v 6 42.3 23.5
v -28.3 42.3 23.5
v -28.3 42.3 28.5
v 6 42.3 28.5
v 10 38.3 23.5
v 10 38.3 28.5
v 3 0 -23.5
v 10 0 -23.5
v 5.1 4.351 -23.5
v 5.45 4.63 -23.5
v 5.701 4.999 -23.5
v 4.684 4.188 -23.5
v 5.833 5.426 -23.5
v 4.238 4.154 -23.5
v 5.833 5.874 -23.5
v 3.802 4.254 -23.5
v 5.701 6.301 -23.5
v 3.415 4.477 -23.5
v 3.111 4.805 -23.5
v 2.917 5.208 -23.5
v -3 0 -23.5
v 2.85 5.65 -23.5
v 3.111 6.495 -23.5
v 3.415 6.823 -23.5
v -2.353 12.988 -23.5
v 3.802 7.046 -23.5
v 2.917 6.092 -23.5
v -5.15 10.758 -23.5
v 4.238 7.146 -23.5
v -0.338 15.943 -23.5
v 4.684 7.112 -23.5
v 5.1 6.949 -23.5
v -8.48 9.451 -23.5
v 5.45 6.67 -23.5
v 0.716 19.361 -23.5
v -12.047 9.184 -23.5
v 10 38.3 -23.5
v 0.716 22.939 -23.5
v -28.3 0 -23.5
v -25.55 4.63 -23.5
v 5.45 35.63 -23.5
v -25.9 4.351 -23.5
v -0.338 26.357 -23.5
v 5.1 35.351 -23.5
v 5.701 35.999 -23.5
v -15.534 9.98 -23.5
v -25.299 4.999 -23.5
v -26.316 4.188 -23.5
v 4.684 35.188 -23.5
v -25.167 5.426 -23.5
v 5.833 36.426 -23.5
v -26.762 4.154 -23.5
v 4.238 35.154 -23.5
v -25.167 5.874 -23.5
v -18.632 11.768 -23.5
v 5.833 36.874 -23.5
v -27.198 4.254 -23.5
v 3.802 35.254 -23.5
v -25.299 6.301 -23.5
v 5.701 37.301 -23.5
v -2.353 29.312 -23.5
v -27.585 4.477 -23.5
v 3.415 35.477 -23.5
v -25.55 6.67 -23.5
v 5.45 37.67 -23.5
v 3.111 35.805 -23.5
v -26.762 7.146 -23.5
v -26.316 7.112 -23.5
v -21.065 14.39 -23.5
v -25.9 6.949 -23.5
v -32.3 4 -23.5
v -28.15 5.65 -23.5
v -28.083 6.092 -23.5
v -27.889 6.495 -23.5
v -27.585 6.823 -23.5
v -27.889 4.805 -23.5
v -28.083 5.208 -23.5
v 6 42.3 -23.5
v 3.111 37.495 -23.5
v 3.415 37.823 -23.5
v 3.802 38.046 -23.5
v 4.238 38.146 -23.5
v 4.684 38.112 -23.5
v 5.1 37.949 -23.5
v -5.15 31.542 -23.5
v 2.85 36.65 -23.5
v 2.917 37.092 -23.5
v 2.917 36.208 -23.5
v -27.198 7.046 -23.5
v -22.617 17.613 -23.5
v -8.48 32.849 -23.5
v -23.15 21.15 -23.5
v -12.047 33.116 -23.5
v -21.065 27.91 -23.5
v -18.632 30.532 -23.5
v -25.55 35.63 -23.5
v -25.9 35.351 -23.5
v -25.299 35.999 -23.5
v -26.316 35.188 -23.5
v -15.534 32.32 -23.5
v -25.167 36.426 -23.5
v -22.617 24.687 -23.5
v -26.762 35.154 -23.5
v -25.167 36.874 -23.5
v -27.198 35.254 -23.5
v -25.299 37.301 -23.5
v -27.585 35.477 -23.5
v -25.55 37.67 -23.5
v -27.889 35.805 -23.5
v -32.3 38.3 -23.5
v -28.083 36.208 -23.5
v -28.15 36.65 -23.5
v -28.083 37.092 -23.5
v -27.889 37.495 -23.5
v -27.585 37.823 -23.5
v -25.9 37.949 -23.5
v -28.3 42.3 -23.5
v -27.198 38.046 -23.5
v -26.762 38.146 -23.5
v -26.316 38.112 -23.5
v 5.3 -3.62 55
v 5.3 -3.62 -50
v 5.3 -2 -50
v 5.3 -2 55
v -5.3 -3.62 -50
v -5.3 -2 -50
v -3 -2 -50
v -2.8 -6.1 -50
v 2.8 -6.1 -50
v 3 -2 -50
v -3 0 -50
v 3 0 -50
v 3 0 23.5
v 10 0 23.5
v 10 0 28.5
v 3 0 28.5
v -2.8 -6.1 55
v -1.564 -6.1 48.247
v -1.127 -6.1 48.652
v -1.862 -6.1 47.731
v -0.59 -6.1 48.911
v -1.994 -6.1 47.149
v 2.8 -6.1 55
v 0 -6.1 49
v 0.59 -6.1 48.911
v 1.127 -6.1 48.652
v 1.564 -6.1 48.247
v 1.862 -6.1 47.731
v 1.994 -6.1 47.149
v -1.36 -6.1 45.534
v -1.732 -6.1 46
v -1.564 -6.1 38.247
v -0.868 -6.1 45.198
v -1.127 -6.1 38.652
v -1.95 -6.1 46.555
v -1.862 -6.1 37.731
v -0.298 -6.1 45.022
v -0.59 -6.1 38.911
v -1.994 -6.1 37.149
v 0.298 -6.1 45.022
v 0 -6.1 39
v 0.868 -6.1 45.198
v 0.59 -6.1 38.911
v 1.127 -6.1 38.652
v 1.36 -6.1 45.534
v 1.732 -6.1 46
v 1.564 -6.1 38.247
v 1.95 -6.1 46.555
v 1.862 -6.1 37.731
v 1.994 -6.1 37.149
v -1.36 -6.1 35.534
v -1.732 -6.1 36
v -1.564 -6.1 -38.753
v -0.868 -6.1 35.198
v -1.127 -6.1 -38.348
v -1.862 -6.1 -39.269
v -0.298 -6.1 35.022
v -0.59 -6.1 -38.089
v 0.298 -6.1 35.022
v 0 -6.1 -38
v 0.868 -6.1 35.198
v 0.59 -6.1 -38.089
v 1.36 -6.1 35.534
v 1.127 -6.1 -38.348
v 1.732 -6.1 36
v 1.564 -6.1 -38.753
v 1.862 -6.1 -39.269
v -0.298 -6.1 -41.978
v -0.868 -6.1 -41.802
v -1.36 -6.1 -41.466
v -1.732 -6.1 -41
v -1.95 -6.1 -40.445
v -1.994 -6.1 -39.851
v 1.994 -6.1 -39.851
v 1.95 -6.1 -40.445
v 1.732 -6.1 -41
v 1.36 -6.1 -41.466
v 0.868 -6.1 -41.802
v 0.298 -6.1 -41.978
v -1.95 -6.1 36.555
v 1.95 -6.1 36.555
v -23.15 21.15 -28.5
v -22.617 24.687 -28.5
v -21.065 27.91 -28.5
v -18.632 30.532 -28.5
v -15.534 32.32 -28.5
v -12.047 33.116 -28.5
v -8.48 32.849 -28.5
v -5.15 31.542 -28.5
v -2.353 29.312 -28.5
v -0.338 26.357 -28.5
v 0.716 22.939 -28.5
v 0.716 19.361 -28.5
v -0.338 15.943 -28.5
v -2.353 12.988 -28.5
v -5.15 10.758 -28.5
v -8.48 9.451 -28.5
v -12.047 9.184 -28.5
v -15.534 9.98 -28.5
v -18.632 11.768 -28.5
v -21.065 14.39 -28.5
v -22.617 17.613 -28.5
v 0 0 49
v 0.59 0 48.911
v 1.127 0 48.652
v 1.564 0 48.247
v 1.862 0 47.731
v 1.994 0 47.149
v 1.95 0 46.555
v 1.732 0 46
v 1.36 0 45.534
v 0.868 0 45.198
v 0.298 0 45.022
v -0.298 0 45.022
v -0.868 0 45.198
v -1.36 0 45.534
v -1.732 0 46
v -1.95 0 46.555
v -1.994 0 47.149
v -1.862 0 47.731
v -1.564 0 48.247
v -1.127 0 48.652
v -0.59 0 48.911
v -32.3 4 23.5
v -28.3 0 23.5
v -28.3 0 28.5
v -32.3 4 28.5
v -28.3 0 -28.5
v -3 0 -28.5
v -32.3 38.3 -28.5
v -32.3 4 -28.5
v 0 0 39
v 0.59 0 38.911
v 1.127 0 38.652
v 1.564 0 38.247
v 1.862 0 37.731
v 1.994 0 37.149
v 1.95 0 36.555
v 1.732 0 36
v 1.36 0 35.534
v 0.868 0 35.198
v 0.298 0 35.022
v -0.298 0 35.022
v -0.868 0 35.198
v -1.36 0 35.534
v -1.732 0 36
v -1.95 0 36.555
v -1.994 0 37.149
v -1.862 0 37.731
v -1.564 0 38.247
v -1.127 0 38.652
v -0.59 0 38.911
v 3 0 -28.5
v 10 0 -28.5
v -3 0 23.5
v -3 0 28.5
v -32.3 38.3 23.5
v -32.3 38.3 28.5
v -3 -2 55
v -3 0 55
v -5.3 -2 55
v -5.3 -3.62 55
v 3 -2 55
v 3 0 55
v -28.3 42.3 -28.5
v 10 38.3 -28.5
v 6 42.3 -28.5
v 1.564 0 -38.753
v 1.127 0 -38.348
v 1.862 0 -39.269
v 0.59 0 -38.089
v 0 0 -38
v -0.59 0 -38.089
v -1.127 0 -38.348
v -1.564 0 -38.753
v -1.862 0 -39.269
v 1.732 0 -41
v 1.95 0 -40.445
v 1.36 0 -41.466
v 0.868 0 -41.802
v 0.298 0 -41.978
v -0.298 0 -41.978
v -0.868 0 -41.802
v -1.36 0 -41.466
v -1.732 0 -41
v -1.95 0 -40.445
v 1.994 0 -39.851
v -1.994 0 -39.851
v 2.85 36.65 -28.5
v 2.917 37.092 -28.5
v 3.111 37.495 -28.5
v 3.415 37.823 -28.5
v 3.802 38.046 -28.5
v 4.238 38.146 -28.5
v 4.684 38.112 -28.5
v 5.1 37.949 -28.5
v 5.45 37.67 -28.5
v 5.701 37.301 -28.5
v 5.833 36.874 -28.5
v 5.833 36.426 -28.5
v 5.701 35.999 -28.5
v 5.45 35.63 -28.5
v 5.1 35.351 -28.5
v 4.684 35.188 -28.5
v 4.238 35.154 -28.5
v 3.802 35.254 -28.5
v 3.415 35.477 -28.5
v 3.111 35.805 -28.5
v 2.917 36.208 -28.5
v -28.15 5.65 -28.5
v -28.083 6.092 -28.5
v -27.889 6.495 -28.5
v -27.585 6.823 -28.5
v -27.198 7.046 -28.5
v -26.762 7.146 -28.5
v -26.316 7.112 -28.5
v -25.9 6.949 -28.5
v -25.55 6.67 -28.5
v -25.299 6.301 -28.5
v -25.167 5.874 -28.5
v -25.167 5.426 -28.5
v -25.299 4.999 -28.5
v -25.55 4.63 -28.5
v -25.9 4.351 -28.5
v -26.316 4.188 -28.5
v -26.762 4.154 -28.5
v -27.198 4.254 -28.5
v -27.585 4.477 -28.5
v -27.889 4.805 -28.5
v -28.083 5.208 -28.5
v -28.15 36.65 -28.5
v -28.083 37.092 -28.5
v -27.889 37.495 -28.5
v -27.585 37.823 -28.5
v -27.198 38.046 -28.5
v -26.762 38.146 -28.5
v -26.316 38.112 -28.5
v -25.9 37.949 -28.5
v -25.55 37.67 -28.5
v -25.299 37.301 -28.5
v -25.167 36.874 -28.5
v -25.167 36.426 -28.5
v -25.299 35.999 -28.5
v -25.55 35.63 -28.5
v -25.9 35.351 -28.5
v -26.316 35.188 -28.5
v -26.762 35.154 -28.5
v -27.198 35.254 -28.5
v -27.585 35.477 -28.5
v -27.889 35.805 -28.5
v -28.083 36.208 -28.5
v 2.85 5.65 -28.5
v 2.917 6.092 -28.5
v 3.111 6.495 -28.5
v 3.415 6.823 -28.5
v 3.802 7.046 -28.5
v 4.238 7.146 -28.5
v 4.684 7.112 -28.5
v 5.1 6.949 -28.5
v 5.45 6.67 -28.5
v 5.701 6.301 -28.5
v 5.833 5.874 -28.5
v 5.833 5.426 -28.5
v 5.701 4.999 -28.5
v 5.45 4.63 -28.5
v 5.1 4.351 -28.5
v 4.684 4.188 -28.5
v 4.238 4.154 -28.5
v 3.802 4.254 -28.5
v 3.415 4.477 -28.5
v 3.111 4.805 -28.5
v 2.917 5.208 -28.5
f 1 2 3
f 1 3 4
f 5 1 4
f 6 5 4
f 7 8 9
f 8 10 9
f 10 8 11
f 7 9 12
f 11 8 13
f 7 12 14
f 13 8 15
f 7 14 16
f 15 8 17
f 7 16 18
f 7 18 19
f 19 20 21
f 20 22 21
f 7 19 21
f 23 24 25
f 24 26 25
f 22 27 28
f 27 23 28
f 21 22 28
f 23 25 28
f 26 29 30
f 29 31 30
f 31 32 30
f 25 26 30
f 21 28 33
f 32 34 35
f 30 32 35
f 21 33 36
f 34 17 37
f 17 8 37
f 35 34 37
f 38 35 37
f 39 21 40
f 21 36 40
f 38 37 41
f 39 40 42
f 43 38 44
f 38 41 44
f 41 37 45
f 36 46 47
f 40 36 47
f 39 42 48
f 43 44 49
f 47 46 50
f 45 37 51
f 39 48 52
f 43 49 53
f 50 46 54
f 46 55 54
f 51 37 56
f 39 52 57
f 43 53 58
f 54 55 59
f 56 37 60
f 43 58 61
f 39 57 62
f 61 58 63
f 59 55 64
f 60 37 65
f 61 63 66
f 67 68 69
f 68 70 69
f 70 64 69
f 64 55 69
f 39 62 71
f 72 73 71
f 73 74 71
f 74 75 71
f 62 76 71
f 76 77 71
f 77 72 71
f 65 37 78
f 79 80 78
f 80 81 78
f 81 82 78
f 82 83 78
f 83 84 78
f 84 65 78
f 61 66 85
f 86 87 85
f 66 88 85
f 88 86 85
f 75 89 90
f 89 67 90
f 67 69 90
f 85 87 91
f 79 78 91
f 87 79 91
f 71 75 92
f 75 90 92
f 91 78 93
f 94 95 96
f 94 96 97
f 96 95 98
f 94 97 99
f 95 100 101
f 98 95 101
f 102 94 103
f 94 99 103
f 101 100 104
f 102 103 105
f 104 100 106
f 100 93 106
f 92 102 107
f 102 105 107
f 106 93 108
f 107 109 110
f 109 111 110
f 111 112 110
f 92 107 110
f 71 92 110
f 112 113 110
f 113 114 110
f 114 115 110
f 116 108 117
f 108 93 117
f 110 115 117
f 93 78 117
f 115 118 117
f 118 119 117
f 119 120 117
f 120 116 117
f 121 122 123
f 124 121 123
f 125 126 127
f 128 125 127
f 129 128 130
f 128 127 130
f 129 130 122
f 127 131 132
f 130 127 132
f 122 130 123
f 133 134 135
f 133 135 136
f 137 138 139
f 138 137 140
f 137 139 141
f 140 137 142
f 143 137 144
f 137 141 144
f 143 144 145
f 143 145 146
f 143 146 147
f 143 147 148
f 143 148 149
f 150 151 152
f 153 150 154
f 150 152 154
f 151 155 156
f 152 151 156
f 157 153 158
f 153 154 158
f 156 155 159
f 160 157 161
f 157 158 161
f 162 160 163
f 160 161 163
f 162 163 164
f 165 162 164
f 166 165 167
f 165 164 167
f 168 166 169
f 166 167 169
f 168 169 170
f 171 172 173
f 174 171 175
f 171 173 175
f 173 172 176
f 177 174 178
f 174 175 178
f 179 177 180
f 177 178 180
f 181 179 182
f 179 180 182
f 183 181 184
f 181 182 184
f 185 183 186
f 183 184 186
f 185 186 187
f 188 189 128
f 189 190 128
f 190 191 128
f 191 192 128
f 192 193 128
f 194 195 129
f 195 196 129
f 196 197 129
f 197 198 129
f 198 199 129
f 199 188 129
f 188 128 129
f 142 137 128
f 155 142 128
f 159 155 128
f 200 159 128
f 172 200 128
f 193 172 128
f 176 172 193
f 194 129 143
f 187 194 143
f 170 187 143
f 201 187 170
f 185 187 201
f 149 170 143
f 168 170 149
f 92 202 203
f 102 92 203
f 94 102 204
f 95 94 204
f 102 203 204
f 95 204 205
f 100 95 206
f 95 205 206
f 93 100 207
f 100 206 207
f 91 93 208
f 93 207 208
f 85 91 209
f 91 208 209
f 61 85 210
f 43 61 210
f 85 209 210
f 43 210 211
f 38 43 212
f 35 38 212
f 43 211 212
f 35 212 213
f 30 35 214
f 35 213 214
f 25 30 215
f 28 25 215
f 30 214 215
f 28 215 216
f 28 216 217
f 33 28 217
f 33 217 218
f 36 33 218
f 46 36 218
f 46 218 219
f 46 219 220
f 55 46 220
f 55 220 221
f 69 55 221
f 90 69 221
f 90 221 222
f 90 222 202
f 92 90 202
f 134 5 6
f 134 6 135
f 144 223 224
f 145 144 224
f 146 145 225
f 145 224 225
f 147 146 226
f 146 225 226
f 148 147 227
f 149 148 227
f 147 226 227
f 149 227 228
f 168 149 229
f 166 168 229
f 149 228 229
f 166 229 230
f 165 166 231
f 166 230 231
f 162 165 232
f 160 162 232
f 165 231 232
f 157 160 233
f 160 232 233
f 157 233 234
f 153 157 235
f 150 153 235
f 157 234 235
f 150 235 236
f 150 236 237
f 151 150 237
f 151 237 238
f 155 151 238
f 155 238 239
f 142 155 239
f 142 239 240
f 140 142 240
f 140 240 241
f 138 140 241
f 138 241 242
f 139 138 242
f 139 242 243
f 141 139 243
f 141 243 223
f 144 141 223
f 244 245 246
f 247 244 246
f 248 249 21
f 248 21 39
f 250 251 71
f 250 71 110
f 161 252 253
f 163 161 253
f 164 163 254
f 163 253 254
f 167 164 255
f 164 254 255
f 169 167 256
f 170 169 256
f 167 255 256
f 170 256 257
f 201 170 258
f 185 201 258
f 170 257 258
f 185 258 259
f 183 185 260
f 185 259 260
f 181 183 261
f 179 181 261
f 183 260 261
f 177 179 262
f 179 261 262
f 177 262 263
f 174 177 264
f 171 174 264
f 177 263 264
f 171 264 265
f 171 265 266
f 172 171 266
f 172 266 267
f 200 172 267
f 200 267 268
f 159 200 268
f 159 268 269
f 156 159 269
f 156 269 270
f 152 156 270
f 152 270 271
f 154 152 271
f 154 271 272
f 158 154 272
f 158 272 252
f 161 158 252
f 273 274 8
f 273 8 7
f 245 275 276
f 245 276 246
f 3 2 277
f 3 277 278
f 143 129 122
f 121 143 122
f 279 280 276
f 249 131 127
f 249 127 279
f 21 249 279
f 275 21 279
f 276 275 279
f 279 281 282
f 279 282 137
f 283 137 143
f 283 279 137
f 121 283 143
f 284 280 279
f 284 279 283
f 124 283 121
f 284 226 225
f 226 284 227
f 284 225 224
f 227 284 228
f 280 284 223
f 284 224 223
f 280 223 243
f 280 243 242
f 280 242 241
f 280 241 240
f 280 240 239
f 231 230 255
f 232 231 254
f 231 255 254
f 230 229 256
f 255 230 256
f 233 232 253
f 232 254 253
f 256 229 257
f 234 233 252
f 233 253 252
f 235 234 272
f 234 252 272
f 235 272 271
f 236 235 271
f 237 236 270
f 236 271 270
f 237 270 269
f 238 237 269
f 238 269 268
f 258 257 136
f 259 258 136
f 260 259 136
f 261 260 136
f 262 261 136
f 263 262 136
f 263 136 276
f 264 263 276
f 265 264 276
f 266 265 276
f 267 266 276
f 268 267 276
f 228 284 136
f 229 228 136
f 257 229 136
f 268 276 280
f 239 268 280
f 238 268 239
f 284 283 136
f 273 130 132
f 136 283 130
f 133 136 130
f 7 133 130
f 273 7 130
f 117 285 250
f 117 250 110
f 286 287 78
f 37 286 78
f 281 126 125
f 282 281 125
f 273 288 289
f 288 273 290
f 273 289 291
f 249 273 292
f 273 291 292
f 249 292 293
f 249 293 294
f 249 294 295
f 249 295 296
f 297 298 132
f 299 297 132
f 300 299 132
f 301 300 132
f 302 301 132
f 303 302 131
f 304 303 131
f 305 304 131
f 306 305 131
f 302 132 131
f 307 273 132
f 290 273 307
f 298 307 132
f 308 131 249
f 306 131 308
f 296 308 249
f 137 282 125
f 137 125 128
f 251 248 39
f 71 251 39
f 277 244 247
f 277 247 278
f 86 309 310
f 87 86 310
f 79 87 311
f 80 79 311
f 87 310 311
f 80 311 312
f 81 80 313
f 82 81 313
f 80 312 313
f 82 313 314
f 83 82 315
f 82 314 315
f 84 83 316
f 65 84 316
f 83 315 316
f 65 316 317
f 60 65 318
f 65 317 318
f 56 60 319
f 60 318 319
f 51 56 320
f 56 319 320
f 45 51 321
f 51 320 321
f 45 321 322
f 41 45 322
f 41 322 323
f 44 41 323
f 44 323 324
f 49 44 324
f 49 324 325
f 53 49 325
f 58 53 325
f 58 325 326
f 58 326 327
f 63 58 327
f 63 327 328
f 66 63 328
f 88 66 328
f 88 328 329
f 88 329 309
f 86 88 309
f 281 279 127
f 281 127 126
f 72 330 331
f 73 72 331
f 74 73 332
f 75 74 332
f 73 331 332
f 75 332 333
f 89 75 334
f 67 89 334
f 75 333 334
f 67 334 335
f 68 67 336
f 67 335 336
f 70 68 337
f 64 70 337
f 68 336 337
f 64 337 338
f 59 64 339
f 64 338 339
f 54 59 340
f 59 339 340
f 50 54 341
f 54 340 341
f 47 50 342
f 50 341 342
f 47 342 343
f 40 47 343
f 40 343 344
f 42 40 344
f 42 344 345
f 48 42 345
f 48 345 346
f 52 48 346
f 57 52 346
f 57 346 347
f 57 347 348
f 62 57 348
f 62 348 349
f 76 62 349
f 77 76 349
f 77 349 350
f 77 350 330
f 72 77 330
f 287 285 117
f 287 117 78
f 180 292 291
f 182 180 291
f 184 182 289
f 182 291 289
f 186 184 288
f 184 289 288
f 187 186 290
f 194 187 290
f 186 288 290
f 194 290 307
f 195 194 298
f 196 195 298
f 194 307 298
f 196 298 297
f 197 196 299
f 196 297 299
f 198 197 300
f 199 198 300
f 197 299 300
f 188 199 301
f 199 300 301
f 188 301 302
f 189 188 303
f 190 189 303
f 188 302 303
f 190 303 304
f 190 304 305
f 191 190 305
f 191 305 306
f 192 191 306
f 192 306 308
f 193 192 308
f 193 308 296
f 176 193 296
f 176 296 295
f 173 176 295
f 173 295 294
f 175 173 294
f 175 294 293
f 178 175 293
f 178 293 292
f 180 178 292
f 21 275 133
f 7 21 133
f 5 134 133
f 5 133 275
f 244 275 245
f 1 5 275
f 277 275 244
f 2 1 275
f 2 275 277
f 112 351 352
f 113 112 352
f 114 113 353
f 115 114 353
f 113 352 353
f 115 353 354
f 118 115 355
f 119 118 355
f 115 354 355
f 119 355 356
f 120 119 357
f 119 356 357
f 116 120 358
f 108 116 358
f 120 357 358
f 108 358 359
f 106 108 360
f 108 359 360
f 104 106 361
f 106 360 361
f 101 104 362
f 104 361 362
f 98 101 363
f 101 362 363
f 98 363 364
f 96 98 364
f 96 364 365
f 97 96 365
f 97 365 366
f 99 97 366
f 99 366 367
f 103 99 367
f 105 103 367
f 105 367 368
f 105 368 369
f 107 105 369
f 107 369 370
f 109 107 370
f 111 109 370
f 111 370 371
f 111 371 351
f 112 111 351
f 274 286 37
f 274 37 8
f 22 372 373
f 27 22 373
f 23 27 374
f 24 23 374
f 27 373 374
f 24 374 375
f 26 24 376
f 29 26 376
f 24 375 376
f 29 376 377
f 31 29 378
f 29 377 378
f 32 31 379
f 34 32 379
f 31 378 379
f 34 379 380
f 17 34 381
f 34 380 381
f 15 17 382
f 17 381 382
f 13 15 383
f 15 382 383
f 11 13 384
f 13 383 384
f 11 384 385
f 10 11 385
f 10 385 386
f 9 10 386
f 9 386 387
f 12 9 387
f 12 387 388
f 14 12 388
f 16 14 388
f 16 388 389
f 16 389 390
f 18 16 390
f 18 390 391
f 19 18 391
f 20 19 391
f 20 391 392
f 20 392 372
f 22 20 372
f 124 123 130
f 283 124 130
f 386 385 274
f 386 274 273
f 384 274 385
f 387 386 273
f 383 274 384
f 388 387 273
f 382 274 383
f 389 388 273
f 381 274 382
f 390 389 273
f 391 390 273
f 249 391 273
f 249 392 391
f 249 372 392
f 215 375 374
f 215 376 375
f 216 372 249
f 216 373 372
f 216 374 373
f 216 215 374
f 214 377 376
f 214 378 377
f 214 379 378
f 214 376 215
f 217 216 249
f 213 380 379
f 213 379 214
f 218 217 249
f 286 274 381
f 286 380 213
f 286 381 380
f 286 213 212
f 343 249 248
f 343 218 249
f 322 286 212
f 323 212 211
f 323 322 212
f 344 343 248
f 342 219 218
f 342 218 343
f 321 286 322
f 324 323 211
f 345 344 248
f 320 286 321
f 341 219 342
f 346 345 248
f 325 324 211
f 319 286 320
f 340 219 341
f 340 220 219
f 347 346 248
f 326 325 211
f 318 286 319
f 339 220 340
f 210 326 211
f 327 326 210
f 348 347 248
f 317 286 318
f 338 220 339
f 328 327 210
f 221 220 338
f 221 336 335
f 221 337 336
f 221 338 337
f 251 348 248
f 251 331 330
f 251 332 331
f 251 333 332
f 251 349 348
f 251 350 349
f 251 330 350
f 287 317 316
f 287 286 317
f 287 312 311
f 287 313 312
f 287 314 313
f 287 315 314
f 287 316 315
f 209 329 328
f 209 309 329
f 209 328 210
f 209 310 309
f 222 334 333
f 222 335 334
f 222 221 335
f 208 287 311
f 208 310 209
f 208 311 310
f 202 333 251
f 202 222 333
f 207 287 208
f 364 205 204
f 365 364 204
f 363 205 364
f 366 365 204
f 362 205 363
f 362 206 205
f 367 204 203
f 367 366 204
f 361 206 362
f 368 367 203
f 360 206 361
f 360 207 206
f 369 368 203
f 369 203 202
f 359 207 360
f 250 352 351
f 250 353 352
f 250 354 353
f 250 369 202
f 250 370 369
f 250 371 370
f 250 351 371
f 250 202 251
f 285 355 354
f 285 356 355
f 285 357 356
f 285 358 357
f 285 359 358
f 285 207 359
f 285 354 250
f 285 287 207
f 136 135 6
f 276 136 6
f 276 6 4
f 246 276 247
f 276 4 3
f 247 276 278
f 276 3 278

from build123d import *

# Parameters (mm, degrees)
BOSS_EXTRUDE1_DEPTH        = 28.5
BOSS_EXTRUDE2_DEPTH        = 5
CHAMFER1_SIZE              = 4
LPATTERN1_COUNT            = 2
LPATTERN1_PITCH            = 52
CHAMFER1_OF_LPATTERN1_SIZE = 4
CUT_EXTRUDE1_REACH         = 79.984
SKETCH4_R                  = 12
SKETCH4_R_2                = 1.5
BOSS_EXTRUDE3_DEPTH        = 55
BOSS_EXTRUDE3_DEPTH_BACK   = 50
SKETCH6_R                  = 2
CUT_EXTRUDE2_DEPTH         = 77.534828673


with BuildPart() as part:
    # Sketch1 → Boss-Extrude1 (new, symmetric)
    with BuildSketch(Plane.XY):
        Polygon((-3, 0), (3, 0), (3, -2), (5.3, -2), (5.3, -3.62), (2.8, -6.1), (-2.8, -6.1), (-5.3, -3.62), (-5.3, -2), (-3, -2), align=None)
    extrude(amount=BOSS_EXTRUDE1_DEPTH, both=True)

    # Sketch2 → Boss-Extrude2 (add)
    with BuildSketch(Plane(origin=(0, 0, -28.5), x_dir=(-1, 0, 0), z_dir=(0, 0, -1))):
        Polygon((32.3, 0), (32.3, 42.3), (-10, 42.3), (-10, 0), (0, 0), align=None)
    boss_extrude2 = extrude(amount=-BOSS_EXTRUDE2_DEPTH)

    # Chamfer1
    chamfer1_edges = [part.edges().sort_by_distance(p)[0] for p in [
        (-32.3, 0, -26),
        (10, 42.3, -26),
        (-32.3, 42.3, -26),
    ]]
    chamfer(chamfer1_edges, length=CHAMFER1_SIZE)

    # LPattern1: Boss-Extrude2 ×2
    with Locations(*[(0, 0, i * LPATTERN1_PITCH) for i in range(1, LPATTERN1_COUNT)]):
        add(boss_extrude2)

    # Chamfer1 of LPattern1
    chamfer1_of_lpattern1_edges = [part.edges().sort_by_distance(p)[0] for p in [
        (-32.3, 0, 26),
        (10, 42.3, 26),
        (-32.3, 42.3, 26),
    ]]
    chamfer(chamfer1_of_lpattern1_edges, length=CHAMFER1_OF_LPATTERN1_SIZE)

    # Sketch4 → Cut-Extrude1 (cut, up to next)
    with BuildSketch(Plane(origin=(0, 0, -28.5), x_dir=(-1, 0, 0), z_dir=(0, 0, -1)), mode=Mode.PRIVATE) as cut_extrude1_sk1:
        with Locations((11.15, 21.15)):
            Circle(SKETCH4_R)
    cut_extrude1_tool1 = extrude(cut_extrude1_sk1.sketch, amount=-CUT_EXTRUDE1_REACH, mode=Mode.PRIVATE) & part.part
    # Sketch4 → Cut-Extrude1 (cut, up to next)
    with BuildSketch(Plane(origin=(0, 0, -28.5), x_dir=(-1, 0, 0), z_dir=(0, 0, -1)), mode=Mode.PRIVATE) as cut_extrude1_sk2:
        with Locations((26.65, 36.65)):
            Circle(SKETCH4_R_2)
    cut_extrude1_tool2 = extrude(cut_extrude1_sk2.sketch, amount=-CUT_EXTRUDE1_REACH, mode=Mode.PRIVATE) & part.part
    # Sketch4 → Cut-Extrude1 (cut, up to next)
    with BuildSketch(Plane(origin=(0, 0, -28.5), x_dir=(-1, 0, 0), z_dir=(0, 0, -1)), mode=Mode.PRIVATE) as cut_extrude1_sk3:
        with Locations((-4.35, 36.65)):
            Circle(SKETCH4_R_2)
    cut_extrude1_tool3 = extrude(cut_extrude1_sk3.sketch, amount=-CUT_EXTRUDE1_REACH, mode=Mode.PRIVATE) & part.part
    # Sketch4 → Cut-Extrude1 (cut, up to next)
    with BuildSketch(Plane(origin=(0, 0, -28.5), x_dir=(-1, 0, 0), z_dir=(0, 0, -1)), mode=Mode.PRIVATE) as cut_extrude1_sk4:
        with Locations((-4.35, 5.65)):
            Circle(SKETCH4_R_2)
    cut_extrude1_tool4 = extrude(cut_extrude1_sk4.sketch, amount=-CUT_EXTRUDE1_REACH, mode=Mode.PRIVATE) & part.part
    # Sketch4 → Cut-Extrude1 (cut, up to next)
    with BuildSketch(Plane(origin=(0, 0, -28.5), x_dir=(-1, 0, 0), z_dir=(0, 0, -1)), mode=Mode.PRIVATE) as cut_extrude1_sk5:
        with Locations((26.65, 5.65)):
            Circle(SKETCH4_R_2)
    cut_extrude1_tool5 = extrude(cut_extrude1_sk5.sketch, amount=-CUT_EXTRUDE1_REACH, mode=Mode.PRIVATE) & part.part
    add(cut_extrude1_tool1.solids().sort_by_distance((-11.15, 21.15, -28.5))[0], mode=Mode.SUBTRACT)
    add(cut_extrude1_tool2.solids().sort_by_distance((-26.65, 36.65, -28.5))[0], mode=Mode.SUBTRACT)
    add(cut_extrude1_tool3.solids().sort_by_distance((4.35, 36.65, -28.5))[0], mode=Mode.SUBTRACT)
    add(cut_extrude1_tool4.solids().sort_by_distance((4.35, 5.65, -28.5))[0], mode=Mode.SUBTRACT)
    add(cut_extrude1_tool5.solids().sort_by_distance((-26.65, 5.65, -28.5))[0], mode=Mode.SUBTRACT)

    # Sketch5 → Boss-Extrude3 (add, two sides: drawn at the far end of the back side and taken through both)
    with BuildSketch(Plane.XY.offset(-BOSS_EXTRUDE3_DEPTH_BACK)):
        Polygon((-3, -2), (-5.3, -2), (-5.3, -3.62), (-2.8, -6.1), (2.8, -6.1), (5.3, -3.62), (5.3, -2), (3, -2), (3, 0), (-3, 0), align=None)
    extrude(amount=BOSS_EXTRUDE3_DEPTH + BOSS_EXTRUDE3_DEPTH_BACK)

    # Sketch6 → Cut-Extrude2 (cut, through all)
    with BuildSketch(Plane(origin=(0, 0, 0), x_dir=(1, 0, 0), z_dir=(0, 1, 0))):
        with Locations(Location((0, 40, 0), (0, 0, 270))):
            Circle(SKETCH6_R)
        with Locations(Location((0, -37, 0), (0, 0, 270))):
            Circle(SKETCH6_R)
        with Locations(Location((0, -47, 0), (0, 0, 270))):
            Circle(SKETCH6_R)
    extrude(amount=-CUT_EXTRUDE2_DEPTH, mode=Mode.SUBTRACT)


solid = part.part
